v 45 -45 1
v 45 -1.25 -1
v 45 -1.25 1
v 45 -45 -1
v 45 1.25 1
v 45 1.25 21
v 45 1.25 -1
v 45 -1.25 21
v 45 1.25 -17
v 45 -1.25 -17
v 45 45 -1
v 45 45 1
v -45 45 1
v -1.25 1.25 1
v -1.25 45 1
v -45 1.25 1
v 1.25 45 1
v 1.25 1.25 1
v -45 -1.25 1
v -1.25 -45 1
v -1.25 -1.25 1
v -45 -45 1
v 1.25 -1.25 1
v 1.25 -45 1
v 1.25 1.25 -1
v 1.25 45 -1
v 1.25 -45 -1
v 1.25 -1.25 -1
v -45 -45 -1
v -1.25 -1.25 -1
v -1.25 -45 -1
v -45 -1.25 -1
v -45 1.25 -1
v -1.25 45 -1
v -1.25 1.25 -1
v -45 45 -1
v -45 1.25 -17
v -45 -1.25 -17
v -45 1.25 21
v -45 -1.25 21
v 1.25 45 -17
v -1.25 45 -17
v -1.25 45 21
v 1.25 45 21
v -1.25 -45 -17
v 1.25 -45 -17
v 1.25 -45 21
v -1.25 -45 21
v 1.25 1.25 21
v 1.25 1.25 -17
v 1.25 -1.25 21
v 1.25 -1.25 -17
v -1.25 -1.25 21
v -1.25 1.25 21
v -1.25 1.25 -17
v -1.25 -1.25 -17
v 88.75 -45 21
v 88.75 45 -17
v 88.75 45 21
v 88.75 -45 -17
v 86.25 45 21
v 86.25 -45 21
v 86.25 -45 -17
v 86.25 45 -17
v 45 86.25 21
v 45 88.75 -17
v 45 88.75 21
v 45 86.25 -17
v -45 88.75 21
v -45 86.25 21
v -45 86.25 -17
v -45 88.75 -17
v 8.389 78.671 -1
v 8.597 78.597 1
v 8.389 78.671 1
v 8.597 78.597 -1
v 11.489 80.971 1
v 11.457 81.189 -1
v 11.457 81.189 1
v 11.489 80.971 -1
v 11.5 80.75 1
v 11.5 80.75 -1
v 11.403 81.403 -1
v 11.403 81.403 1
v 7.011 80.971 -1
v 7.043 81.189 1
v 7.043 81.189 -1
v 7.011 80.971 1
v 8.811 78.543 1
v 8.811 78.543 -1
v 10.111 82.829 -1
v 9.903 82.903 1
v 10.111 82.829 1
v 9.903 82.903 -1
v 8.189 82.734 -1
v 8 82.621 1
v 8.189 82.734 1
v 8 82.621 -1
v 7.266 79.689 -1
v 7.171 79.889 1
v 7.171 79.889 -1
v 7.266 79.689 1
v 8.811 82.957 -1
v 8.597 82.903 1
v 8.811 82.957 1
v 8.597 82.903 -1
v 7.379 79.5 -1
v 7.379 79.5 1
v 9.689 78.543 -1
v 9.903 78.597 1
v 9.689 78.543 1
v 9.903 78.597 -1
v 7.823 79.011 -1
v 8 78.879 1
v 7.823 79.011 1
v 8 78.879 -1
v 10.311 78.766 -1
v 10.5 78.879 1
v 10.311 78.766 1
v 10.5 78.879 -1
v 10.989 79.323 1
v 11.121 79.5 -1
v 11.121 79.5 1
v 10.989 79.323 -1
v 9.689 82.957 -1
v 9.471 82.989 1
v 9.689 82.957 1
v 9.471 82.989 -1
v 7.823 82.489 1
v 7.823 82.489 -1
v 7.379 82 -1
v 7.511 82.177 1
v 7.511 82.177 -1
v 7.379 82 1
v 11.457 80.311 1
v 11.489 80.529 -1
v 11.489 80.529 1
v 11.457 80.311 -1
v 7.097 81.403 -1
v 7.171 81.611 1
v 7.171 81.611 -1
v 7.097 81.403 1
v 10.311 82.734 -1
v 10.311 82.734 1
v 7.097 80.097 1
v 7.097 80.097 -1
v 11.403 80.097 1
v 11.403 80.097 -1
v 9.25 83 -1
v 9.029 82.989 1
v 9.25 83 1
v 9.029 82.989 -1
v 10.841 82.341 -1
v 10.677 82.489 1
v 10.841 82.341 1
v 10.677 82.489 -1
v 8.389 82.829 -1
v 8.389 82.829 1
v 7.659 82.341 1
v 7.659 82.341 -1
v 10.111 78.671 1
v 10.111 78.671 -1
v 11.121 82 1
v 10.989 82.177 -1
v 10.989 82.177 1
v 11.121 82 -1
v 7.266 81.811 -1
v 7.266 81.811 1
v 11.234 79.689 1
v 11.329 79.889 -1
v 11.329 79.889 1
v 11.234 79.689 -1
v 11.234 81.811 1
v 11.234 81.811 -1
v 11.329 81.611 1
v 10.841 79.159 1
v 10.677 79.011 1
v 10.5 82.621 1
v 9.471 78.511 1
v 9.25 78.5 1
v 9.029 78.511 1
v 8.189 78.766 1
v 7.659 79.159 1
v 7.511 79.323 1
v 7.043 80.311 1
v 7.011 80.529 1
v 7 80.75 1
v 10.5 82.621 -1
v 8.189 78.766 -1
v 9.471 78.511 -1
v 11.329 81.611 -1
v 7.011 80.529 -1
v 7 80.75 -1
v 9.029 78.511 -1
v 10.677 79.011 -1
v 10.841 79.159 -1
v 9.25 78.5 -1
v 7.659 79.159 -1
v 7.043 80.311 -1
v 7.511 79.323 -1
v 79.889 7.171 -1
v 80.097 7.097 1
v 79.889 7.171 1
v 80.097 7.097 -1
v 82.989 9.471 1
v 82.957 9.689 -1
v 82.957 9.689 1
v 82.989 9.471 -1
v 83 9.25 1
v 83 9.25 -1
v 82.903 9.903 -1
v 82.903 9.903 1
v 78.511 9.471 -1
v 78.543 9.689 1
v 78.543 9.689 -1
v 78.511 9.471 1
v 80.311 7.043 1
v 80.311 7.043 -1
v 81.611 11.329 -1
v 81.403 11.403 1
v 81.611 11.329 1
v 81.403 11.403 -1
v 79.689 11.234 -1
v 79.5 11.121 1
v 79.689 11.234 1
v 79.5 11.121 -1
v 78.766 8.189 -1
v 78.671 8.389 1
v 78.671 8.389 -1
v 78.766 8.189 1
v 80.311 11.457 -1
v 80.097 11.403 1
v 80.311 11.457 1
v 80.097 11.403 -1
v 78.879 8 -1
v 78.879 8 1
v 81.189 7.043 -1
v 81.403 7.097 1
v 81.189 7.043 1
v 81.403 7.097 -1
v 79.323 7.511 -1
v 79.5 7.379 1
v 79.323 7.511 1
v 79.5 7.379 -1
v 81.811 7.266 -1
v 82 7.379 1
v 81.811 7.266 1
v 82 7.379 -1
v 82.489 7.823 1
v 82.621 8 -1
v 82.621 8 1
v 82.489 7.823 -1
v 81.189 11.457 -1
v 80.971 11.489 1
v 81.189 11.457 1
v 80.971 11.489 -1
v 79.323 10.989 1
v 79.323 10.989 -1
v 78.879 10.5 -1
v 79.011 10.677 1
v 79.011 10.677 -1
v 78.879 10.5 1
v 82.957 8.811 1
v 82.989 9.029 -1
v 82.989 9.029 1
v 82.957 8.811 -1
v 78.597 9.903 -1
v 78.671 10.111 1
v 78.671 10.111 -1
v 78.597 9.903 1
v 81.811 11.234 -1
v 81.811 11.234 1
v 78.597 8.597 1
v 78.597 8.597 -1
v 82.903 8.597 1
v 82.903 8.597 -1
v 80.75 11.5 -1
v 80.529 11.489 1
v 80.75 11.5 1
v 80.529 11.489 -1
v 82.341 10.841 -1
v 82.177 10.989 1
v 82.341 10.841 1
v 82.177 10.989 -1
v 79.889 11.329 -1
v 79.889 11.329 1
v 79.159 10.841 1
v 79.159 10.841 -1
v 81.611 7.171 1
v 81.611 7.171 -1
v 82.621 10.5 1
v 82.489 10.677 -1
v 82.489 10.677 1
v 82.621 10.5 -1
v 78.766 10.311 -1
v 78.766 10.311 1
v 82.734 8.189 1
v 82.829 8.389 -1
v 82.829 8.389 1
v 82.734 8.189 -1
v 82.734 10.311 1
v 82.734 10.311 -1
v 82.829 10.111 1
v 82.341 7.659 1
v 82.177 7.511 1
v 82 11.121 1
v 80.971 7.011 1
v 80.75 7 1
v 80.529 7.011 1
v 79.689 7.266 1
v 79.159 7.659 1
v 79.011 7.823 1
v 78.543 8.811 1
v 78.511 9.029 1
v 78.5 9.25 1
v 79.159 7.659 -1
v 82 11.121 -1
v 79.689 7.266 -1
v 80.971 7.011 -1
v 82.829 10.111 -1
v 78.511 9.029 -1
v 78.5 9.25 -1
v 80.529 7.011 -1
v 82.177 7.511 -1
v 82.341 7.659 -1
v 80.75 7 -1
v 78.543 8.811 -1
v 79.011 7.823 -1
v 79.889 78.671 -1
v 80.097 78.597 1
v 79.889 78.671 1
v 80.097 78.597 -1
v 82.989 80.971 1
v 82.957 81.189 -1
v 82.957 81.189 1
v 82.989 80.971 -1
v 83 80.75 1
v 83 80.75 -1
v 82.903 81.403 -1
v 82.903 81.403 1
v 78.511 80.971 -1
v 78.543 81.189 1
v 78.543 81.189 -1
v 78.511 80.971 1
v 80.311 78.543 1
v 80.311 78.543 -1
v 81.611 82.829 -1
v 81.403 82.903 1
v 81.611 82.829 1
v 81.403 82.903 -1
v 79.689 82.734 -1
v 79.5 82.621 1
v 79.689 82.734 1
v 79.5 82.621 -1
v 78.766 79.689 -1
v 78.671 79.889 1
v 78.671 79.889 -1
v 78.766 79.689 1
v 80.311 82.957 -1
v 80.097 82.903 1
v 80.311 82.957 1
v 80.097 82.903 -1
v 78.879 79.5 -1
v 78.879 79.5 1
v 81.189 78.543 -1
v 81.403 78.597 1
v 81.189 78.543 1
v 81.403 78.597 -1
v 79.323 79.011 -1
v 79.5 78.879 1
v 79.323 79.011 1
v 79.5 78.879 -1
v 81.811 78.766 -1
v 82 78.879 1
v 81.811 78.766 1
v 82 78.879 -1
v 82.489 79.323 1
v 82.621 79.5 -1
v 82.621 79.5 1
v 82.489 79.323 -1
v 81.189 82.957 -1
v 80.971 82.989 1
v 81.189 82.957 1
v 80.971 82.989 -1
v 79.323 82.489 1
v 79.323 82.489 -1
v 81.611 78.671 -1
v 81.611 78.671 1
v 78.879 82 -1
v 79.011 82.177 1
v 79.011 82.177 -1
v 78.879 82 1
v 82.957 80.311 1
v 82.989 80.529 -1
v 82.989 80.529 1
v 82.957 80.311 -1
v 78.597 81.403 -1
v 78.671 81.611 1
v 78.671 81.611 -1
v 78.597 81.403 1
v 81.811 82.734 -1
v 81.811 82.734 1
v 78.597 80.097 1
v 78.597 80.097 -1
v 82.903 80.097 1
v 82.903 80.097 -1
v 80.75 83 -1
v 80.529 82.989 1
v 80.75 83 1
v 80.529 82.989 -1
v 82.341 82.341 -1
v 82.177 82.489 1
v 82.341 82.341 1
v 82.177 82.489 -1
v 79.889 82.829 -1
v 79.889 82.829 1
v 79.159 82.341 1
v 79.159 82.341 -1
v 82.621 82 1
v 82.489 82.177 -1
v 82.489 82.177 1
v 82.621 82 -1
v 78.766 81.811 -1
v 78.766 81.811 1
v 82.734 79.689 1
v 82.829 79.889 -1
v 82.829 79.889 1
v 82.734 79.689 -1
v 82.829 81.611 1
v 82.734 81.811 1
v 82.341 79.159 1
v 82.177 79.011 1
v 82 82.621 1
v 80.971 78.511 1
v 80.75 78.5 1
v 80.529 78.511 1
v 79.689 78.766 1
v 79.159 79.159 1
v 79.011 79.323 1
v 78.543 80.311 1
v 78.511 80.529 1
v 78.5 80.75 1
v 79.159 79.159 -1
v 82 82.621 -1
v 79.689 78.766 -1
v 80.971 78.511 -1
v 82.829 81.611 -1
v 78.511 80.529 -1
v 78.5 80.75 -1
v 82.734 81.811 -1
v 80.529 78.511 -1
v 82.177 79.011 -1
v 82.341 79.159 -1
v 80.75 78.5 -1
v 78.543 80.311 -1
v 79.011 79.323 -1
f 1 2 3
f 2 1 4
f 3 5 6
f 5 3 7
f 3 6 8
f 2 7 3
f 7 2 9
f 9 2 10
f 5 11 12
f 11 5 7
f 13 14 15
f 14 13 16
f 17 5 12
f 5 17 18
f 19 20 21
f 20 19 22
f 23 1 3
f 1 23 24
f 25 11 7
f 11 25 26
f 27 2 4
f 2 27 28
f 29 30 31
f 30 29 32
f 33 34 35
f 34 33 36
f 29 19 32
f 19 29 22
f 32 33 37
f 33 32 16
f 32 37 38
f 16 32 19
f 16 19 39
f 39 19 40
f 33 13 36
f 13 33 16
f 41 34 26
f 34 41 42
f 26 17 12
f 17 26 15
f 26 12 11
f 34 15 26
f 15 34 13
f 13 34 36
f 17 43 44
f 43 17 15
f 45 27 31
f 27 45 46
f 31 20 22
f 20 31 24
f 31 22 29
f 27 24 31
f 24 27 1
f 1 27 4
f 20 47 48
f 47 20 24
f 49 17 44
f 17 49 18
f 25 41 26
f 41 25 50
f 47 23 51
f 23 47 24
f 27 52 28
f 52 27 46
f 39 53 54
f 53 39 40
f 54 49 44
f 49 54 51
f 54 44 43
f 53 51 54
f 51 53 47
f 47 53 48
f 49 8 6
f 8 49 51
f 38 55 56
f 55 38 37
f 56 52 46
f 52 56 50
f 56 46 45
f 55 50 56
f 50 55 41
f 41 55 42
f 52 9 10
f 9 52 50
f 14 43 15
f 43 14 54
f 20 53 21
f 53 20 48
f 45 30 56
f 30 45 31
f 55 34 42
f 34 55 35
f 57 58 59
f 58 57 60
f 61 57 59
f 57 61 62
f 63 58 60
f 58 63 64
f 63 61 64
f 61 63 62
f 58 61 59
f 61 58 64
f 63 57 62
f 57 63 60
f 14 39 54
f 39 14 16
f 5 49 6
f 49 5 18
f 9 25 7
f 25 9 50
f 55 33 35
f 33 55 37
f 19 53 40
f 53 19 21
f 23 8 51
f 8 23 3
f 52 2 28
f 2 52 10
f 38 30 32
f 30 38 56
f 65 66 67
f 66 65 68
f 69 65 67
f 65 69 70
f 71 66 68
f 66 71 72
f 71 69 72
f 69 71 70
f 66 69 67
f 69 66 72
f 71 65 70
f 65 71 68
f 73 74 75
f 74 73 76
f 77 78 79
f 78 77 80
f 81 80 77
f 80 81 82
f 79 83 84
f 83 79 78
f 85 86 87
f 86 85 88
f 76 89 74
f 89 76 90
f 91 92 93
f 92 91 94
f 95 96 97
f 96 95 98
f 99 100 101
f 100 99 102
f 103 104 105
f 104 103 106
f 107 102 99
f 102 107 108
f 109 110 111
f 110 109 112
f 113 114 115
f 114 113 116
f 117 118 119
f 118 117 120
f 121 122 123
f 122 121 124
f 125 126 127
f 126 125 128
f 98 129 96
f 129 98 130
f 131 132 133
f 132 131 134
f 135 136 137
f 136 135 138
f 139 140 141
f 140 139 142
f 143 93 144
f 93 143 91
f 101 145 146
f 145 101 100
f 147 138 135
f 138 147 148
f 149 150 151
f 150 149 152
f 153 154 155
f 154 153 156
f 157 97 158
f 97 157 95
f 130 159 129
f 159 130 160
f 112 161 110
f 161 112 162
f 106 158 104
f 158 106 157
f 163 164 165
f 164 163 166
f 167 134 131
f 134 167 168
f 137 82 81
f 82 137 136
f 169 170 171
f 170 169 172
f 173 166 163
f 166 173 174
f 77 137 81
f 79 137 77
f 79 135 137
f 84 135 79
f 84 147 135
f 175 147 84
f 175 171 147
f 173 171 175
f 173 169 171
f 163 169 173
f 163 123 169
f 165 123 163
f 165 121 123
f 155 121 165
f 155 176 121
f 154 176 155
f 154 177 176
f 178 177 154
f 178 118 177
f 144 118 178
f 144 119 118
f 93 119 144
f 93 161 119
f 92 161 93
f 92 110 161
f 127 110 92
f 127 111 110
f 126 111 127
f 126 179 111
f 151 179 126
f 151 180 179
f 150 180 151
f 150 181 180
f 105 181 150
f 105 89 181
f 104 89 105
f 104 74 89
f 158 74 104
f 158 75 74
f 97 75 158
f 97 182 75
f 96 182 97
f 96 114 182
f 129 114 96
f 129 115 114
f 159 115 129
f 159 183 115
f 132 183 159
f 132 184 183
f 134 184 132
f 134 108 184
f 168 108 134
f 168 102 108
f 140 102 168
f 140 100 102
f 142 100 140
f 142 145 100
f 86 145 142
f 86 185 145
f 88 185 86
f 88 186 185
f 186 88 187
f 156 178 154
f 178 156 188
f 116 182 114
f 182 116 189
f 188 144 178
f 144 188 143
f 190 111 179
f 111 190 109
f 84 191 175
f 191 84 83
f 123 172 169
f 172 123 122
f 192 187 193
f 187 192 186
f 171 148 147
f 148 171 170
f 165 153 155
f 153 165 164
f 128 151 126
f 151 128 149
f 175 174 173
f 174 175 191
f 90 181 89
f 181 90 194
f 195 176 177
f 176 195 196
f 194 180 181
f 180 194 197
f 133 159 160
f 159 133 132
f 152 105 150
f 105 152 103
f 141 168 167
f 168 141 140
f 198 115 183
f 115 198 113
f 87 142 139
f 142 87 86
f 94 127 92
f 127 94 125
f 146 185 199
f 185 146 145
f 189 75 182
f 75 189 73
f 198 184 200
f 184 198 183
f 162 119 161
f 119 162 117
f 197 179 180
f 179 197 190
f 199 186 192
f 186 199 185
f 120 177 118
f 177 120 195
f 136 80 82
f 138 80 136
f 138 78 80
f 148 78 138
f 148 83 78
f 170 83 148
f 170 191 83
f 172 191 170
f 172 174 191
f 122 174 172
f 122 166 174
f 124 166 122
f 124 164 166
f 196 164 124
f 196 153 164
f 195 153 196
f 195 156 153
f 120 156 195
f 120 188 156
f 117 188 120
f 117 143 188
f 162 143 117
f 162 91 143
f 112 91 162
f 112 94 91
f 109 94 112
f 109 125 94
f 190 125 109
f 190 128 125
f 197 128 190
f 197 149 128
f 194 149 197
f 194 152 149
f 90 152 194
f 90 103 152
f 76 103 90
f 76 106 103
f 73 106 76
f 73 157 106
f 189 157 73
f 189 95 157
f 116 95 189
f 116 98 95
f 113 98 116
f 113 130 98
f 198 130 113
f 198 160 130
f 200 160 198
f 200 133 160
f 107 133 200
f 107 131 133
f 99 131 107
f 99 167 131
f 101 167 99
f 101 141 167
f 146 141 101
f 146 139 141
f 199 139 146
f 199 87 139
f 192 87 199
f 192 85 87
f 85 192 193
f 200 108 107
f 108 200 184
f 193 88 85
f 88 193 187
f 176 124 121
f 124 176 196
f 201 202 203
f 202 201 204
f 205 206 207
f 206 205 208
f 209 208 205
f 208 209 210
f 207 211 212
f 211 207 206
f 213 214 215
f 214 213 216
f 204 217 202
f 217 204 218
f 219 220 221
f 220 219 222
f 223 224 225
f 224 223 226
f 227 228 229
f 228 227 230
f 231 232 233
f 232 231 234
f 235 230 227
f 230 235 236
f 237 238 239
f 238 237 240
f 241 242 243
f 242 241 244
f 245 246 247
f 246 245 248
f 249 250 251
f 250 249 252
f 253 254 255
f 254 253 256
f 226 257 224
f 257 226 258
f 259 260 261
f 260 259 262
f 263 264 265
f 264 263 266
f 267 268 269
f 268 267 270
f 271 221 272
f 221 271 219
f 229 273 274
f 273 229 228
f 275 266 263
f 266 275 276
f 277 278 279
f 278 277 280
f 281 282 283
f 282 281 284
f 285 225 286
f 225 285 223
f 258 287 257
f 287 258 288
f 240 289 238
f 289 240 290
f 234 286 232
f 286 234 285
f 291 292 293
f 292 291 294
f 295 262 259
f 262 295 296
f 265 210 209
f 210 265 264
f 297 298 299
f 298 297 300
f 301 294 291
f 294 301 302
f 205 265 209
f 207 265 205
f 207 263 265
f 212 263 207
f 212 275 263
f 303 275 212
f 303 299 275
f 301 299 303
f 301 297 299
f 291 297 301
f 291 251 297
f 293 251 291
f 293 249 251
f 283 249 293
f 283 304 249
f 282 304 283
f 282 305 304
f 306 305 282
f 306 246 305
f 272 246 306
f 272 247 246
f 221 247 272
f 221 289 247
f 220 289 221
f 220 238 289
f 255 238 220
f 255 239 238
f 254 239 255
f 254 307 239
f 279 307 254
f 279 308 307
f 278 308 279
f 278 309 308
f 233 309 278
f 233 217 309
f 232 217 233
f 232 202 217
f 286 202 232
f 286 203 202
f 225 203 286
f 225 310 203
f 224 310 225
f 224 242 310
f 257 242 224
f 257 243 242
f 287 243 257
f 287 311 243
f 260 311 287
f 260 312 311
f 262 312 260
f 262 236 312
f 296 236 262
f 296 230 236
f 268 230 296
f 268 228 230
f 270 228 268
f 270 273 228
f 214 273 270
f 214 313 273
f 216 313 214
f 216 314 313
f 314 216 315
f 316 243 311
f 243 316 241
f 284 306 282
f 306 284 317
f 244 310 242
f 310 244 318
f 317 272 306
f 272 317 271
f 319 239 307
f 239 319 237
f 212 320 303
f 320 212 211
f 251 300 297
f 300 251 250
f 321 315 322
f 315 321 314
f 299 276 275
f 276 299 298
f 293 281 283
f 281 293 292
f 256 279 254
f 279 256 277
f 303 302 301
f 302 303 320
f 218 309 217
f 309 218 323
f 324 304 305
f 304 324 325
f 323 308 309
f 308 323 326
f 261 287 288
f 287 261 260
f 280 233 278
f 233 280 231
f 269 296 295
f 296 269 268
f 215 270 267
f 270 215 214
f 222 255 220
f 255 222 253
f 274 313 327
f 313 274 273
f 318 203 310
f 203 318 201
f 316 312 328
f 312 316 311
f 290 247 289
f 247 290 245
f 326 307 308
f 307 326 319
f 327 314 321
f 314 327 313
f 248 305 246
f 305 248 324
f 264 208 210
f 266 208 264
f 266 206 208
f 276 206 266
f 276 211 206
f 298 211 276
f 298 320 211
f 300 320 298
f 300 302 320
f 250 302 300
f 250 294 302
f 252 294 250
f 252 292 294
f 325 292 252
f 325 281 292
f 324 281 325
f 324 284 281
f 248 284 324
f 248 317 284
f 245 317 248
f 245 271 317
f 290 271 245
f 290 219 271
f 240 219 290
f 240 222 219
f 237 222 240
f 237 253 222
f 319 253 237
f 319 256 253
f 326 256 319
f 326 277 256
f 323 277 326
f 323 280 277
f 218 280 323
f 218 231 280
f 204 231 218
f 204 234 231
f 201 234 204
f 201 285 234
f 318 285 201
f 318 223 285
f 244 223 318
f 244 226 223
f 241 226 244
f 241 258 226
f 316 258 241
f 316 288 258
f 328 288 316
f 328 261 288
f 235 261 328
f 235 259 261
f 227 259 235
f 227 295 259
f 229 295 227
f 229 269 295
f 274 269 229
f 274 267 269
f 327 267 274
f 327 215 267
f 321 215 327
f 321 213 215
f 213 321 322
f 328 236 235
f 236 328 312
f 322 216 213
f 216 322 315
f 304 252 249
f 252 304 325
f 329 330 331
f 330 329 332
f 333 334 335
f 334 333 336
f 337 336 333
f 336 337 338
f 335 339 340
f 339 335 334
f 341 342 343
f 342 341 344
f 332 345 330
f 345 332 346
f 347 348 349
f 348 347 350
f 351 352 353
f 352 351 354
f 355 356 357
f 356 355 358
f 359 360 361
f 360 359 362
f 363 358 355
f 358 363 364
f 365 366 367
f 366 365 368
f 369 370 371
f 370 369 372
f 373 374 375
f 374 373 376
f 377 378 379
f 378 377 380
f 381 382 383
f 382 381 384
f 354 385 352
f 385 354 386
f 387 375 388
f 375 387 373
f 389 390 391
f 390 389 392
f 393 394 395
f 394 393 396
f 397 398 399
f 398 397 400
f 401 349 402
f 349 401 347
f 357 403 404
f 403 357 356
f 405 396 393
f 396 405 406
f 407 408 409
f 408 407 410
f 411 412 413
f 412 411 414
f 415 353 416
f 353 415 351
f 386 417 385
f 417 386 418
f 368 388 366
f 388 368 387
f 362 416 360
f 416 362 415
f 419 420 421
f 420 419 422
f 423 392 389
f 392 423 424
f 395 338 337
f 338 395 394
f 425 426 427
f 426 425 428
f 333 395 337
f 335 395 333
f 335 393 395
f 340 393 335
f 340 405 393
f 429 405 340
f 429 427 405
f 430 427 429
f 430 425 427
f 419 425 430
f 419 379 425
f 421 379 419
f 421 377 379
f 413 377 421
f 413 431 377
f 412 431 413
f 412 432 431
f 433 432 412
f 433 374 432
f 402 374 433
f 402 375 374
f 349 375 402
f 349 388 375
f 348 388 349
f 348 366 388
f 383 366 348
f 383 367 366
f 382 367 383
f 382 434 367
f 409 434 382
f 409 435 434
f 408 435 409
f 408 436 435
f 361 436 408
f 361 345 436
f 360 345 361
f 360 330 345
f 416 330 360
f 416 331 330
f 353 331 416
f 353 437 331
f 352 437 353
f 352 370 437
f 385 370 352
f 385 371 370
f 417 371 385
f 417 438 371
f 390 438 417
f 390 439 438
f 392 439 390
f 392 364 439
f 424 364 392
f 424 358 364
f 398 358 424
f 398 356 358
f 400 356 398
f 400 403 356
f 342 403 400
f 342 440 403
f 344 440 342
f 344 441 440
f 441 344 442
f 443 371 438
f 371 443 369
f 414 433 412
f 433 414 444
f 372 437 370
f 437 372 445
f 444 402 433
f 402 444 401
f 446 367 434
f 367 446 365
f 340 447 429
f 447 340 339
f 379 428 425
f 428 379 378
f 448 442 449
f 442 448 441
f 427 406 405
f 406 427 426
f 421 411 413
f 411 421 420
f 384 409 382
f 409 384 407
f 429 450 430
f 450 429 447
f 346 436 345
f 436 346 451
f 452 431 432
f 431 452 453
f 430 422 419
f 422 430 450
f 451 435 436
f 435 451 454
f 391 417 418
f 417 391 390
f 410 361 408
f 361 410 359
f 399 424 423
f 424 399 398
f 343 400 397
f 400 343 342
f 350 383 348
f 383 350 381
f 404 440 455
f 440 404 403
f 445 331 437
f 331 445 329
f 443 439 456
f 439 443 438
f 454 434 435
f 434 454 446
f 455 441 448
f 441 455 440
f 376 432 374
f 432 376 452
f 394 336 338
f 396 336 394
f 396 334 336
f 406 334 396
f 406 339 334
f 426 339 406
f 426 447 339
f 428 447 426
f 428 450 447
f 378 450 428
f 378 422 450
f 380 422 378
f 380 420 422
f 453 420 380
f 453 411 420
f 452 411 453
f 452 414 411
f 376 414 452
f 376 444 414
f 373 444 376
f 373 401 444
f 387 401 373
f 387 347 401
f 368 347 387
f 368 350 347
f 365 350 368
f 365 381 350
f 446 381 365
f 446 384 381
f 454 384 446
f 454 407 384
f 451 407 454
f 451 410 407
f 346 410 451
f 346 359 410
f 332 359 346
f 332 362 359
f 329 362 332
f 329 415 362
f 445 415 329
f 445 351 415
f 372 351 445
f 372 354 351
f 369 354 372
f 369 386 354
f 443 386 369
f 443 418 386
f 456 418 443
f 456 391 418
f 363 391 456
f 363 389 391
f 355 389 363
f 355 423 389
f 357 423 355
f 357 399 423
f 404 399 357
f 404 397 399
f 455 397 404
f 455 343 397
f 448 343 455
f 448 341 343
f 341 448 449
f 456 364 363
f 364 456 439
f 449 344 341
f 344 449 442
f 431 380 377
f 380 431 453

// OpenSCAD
// Dimensions for DIY magnetic stirrer housing from 80mm PC case fan
$fn = 64;

// Outer size of housing (X x Y)
outer_size_x = 90;
outer_size_y = 90;

// Wall thickness (2.5 mm)
wall_thickness = 2.5;

// Top plate thickness (2 mm)
top_thickness = 2.0;

// Height of housing (from z=0 to z=40)
housing_height = 40;

// Hole diameter (4.5 mm) for M4 screws
hole_diameter = 4.5;

// Screw hole pattern (71.5 mm square, centered on top plate)
hole_spacing = 71.5;

// Power cable notch: 12 mm wide, centered, from z=32 to z=40 (8 mm down from open edge)
notch_width = 12;
notch_depth = 8;

// Define the housing as a union of top plate and walls
module housing() {
    // Top plate: 90x90x2 mm, at z=0 to z=2
    cube([outer_size_x, outer_size_y, top_thickness], center=true);

    // Four walls: 2.5 mm thick, extending from z=2 to z=40
    // Wall on left (x=0 to x=90)
    translate([0, 0, 2]) cube([wall_thickness, outer_size_y, housing_height - 2], center=true);
    
    // Wall on right (x=90 to x=0)
    translate([outer_size_x - wall_thickness, 0, 2]) cube([wall_thickness, outer_size_y, housing_height - 2], center=true);
    
    // Wall on front (y=0 to y=90)
    translate([0, 0, 2]) cube([outer_size_x, wall_thickness, housing_height - 2], center=true);
    
    // Wall on back (y=90 to y=0)
    translate([0, outer_size_y - wall_thickness, 2]) cube([outer_size_x, wall_thickness, housing_height - 2], center=true);
}

// Create the housing
housing();

// Drill four 4.5 mm holes for M4 screws on top plate (centered, 71.5 mm apart)
// Holes are centered on the top plate (z=0 to z=2)
// Pattern: 71.5 mm square, centered at (45, 45)
for (i = [0, 1]) {
    for (j = [0, 1]) {
        translate([
            45 - hole_spacing/2 + i * hole_spacing,
            45 - hole_spacing/2 + j * hole_spacing,
            0
        ]) 
        cylinder(d=hole_diameter, h=top_thickness, center=true);
    }
}

// Cut a notch for power cable in one wall (say, the front wall)
// Notch: 12 mm wide, centered along the front wall, from z=32 to z=40
// Position: centered along y-axis, at x=45, from y=0 to y=12
translate([0, 0, 2]) // start at z=2 (bottom of wall)
difference() {
    // Front wall (from z=2 to z=40)
    cube([outer_size_x, wall_thickness, housing_height - 2], center=true);
    
    // Notch: 12 mm wide, centered in y, from z=32 to z=40
    translate([0, 0, 32]) // start at z=32
    cube([outer_size_x, notch_width, 8], center=true); // 8 mm deep
}
